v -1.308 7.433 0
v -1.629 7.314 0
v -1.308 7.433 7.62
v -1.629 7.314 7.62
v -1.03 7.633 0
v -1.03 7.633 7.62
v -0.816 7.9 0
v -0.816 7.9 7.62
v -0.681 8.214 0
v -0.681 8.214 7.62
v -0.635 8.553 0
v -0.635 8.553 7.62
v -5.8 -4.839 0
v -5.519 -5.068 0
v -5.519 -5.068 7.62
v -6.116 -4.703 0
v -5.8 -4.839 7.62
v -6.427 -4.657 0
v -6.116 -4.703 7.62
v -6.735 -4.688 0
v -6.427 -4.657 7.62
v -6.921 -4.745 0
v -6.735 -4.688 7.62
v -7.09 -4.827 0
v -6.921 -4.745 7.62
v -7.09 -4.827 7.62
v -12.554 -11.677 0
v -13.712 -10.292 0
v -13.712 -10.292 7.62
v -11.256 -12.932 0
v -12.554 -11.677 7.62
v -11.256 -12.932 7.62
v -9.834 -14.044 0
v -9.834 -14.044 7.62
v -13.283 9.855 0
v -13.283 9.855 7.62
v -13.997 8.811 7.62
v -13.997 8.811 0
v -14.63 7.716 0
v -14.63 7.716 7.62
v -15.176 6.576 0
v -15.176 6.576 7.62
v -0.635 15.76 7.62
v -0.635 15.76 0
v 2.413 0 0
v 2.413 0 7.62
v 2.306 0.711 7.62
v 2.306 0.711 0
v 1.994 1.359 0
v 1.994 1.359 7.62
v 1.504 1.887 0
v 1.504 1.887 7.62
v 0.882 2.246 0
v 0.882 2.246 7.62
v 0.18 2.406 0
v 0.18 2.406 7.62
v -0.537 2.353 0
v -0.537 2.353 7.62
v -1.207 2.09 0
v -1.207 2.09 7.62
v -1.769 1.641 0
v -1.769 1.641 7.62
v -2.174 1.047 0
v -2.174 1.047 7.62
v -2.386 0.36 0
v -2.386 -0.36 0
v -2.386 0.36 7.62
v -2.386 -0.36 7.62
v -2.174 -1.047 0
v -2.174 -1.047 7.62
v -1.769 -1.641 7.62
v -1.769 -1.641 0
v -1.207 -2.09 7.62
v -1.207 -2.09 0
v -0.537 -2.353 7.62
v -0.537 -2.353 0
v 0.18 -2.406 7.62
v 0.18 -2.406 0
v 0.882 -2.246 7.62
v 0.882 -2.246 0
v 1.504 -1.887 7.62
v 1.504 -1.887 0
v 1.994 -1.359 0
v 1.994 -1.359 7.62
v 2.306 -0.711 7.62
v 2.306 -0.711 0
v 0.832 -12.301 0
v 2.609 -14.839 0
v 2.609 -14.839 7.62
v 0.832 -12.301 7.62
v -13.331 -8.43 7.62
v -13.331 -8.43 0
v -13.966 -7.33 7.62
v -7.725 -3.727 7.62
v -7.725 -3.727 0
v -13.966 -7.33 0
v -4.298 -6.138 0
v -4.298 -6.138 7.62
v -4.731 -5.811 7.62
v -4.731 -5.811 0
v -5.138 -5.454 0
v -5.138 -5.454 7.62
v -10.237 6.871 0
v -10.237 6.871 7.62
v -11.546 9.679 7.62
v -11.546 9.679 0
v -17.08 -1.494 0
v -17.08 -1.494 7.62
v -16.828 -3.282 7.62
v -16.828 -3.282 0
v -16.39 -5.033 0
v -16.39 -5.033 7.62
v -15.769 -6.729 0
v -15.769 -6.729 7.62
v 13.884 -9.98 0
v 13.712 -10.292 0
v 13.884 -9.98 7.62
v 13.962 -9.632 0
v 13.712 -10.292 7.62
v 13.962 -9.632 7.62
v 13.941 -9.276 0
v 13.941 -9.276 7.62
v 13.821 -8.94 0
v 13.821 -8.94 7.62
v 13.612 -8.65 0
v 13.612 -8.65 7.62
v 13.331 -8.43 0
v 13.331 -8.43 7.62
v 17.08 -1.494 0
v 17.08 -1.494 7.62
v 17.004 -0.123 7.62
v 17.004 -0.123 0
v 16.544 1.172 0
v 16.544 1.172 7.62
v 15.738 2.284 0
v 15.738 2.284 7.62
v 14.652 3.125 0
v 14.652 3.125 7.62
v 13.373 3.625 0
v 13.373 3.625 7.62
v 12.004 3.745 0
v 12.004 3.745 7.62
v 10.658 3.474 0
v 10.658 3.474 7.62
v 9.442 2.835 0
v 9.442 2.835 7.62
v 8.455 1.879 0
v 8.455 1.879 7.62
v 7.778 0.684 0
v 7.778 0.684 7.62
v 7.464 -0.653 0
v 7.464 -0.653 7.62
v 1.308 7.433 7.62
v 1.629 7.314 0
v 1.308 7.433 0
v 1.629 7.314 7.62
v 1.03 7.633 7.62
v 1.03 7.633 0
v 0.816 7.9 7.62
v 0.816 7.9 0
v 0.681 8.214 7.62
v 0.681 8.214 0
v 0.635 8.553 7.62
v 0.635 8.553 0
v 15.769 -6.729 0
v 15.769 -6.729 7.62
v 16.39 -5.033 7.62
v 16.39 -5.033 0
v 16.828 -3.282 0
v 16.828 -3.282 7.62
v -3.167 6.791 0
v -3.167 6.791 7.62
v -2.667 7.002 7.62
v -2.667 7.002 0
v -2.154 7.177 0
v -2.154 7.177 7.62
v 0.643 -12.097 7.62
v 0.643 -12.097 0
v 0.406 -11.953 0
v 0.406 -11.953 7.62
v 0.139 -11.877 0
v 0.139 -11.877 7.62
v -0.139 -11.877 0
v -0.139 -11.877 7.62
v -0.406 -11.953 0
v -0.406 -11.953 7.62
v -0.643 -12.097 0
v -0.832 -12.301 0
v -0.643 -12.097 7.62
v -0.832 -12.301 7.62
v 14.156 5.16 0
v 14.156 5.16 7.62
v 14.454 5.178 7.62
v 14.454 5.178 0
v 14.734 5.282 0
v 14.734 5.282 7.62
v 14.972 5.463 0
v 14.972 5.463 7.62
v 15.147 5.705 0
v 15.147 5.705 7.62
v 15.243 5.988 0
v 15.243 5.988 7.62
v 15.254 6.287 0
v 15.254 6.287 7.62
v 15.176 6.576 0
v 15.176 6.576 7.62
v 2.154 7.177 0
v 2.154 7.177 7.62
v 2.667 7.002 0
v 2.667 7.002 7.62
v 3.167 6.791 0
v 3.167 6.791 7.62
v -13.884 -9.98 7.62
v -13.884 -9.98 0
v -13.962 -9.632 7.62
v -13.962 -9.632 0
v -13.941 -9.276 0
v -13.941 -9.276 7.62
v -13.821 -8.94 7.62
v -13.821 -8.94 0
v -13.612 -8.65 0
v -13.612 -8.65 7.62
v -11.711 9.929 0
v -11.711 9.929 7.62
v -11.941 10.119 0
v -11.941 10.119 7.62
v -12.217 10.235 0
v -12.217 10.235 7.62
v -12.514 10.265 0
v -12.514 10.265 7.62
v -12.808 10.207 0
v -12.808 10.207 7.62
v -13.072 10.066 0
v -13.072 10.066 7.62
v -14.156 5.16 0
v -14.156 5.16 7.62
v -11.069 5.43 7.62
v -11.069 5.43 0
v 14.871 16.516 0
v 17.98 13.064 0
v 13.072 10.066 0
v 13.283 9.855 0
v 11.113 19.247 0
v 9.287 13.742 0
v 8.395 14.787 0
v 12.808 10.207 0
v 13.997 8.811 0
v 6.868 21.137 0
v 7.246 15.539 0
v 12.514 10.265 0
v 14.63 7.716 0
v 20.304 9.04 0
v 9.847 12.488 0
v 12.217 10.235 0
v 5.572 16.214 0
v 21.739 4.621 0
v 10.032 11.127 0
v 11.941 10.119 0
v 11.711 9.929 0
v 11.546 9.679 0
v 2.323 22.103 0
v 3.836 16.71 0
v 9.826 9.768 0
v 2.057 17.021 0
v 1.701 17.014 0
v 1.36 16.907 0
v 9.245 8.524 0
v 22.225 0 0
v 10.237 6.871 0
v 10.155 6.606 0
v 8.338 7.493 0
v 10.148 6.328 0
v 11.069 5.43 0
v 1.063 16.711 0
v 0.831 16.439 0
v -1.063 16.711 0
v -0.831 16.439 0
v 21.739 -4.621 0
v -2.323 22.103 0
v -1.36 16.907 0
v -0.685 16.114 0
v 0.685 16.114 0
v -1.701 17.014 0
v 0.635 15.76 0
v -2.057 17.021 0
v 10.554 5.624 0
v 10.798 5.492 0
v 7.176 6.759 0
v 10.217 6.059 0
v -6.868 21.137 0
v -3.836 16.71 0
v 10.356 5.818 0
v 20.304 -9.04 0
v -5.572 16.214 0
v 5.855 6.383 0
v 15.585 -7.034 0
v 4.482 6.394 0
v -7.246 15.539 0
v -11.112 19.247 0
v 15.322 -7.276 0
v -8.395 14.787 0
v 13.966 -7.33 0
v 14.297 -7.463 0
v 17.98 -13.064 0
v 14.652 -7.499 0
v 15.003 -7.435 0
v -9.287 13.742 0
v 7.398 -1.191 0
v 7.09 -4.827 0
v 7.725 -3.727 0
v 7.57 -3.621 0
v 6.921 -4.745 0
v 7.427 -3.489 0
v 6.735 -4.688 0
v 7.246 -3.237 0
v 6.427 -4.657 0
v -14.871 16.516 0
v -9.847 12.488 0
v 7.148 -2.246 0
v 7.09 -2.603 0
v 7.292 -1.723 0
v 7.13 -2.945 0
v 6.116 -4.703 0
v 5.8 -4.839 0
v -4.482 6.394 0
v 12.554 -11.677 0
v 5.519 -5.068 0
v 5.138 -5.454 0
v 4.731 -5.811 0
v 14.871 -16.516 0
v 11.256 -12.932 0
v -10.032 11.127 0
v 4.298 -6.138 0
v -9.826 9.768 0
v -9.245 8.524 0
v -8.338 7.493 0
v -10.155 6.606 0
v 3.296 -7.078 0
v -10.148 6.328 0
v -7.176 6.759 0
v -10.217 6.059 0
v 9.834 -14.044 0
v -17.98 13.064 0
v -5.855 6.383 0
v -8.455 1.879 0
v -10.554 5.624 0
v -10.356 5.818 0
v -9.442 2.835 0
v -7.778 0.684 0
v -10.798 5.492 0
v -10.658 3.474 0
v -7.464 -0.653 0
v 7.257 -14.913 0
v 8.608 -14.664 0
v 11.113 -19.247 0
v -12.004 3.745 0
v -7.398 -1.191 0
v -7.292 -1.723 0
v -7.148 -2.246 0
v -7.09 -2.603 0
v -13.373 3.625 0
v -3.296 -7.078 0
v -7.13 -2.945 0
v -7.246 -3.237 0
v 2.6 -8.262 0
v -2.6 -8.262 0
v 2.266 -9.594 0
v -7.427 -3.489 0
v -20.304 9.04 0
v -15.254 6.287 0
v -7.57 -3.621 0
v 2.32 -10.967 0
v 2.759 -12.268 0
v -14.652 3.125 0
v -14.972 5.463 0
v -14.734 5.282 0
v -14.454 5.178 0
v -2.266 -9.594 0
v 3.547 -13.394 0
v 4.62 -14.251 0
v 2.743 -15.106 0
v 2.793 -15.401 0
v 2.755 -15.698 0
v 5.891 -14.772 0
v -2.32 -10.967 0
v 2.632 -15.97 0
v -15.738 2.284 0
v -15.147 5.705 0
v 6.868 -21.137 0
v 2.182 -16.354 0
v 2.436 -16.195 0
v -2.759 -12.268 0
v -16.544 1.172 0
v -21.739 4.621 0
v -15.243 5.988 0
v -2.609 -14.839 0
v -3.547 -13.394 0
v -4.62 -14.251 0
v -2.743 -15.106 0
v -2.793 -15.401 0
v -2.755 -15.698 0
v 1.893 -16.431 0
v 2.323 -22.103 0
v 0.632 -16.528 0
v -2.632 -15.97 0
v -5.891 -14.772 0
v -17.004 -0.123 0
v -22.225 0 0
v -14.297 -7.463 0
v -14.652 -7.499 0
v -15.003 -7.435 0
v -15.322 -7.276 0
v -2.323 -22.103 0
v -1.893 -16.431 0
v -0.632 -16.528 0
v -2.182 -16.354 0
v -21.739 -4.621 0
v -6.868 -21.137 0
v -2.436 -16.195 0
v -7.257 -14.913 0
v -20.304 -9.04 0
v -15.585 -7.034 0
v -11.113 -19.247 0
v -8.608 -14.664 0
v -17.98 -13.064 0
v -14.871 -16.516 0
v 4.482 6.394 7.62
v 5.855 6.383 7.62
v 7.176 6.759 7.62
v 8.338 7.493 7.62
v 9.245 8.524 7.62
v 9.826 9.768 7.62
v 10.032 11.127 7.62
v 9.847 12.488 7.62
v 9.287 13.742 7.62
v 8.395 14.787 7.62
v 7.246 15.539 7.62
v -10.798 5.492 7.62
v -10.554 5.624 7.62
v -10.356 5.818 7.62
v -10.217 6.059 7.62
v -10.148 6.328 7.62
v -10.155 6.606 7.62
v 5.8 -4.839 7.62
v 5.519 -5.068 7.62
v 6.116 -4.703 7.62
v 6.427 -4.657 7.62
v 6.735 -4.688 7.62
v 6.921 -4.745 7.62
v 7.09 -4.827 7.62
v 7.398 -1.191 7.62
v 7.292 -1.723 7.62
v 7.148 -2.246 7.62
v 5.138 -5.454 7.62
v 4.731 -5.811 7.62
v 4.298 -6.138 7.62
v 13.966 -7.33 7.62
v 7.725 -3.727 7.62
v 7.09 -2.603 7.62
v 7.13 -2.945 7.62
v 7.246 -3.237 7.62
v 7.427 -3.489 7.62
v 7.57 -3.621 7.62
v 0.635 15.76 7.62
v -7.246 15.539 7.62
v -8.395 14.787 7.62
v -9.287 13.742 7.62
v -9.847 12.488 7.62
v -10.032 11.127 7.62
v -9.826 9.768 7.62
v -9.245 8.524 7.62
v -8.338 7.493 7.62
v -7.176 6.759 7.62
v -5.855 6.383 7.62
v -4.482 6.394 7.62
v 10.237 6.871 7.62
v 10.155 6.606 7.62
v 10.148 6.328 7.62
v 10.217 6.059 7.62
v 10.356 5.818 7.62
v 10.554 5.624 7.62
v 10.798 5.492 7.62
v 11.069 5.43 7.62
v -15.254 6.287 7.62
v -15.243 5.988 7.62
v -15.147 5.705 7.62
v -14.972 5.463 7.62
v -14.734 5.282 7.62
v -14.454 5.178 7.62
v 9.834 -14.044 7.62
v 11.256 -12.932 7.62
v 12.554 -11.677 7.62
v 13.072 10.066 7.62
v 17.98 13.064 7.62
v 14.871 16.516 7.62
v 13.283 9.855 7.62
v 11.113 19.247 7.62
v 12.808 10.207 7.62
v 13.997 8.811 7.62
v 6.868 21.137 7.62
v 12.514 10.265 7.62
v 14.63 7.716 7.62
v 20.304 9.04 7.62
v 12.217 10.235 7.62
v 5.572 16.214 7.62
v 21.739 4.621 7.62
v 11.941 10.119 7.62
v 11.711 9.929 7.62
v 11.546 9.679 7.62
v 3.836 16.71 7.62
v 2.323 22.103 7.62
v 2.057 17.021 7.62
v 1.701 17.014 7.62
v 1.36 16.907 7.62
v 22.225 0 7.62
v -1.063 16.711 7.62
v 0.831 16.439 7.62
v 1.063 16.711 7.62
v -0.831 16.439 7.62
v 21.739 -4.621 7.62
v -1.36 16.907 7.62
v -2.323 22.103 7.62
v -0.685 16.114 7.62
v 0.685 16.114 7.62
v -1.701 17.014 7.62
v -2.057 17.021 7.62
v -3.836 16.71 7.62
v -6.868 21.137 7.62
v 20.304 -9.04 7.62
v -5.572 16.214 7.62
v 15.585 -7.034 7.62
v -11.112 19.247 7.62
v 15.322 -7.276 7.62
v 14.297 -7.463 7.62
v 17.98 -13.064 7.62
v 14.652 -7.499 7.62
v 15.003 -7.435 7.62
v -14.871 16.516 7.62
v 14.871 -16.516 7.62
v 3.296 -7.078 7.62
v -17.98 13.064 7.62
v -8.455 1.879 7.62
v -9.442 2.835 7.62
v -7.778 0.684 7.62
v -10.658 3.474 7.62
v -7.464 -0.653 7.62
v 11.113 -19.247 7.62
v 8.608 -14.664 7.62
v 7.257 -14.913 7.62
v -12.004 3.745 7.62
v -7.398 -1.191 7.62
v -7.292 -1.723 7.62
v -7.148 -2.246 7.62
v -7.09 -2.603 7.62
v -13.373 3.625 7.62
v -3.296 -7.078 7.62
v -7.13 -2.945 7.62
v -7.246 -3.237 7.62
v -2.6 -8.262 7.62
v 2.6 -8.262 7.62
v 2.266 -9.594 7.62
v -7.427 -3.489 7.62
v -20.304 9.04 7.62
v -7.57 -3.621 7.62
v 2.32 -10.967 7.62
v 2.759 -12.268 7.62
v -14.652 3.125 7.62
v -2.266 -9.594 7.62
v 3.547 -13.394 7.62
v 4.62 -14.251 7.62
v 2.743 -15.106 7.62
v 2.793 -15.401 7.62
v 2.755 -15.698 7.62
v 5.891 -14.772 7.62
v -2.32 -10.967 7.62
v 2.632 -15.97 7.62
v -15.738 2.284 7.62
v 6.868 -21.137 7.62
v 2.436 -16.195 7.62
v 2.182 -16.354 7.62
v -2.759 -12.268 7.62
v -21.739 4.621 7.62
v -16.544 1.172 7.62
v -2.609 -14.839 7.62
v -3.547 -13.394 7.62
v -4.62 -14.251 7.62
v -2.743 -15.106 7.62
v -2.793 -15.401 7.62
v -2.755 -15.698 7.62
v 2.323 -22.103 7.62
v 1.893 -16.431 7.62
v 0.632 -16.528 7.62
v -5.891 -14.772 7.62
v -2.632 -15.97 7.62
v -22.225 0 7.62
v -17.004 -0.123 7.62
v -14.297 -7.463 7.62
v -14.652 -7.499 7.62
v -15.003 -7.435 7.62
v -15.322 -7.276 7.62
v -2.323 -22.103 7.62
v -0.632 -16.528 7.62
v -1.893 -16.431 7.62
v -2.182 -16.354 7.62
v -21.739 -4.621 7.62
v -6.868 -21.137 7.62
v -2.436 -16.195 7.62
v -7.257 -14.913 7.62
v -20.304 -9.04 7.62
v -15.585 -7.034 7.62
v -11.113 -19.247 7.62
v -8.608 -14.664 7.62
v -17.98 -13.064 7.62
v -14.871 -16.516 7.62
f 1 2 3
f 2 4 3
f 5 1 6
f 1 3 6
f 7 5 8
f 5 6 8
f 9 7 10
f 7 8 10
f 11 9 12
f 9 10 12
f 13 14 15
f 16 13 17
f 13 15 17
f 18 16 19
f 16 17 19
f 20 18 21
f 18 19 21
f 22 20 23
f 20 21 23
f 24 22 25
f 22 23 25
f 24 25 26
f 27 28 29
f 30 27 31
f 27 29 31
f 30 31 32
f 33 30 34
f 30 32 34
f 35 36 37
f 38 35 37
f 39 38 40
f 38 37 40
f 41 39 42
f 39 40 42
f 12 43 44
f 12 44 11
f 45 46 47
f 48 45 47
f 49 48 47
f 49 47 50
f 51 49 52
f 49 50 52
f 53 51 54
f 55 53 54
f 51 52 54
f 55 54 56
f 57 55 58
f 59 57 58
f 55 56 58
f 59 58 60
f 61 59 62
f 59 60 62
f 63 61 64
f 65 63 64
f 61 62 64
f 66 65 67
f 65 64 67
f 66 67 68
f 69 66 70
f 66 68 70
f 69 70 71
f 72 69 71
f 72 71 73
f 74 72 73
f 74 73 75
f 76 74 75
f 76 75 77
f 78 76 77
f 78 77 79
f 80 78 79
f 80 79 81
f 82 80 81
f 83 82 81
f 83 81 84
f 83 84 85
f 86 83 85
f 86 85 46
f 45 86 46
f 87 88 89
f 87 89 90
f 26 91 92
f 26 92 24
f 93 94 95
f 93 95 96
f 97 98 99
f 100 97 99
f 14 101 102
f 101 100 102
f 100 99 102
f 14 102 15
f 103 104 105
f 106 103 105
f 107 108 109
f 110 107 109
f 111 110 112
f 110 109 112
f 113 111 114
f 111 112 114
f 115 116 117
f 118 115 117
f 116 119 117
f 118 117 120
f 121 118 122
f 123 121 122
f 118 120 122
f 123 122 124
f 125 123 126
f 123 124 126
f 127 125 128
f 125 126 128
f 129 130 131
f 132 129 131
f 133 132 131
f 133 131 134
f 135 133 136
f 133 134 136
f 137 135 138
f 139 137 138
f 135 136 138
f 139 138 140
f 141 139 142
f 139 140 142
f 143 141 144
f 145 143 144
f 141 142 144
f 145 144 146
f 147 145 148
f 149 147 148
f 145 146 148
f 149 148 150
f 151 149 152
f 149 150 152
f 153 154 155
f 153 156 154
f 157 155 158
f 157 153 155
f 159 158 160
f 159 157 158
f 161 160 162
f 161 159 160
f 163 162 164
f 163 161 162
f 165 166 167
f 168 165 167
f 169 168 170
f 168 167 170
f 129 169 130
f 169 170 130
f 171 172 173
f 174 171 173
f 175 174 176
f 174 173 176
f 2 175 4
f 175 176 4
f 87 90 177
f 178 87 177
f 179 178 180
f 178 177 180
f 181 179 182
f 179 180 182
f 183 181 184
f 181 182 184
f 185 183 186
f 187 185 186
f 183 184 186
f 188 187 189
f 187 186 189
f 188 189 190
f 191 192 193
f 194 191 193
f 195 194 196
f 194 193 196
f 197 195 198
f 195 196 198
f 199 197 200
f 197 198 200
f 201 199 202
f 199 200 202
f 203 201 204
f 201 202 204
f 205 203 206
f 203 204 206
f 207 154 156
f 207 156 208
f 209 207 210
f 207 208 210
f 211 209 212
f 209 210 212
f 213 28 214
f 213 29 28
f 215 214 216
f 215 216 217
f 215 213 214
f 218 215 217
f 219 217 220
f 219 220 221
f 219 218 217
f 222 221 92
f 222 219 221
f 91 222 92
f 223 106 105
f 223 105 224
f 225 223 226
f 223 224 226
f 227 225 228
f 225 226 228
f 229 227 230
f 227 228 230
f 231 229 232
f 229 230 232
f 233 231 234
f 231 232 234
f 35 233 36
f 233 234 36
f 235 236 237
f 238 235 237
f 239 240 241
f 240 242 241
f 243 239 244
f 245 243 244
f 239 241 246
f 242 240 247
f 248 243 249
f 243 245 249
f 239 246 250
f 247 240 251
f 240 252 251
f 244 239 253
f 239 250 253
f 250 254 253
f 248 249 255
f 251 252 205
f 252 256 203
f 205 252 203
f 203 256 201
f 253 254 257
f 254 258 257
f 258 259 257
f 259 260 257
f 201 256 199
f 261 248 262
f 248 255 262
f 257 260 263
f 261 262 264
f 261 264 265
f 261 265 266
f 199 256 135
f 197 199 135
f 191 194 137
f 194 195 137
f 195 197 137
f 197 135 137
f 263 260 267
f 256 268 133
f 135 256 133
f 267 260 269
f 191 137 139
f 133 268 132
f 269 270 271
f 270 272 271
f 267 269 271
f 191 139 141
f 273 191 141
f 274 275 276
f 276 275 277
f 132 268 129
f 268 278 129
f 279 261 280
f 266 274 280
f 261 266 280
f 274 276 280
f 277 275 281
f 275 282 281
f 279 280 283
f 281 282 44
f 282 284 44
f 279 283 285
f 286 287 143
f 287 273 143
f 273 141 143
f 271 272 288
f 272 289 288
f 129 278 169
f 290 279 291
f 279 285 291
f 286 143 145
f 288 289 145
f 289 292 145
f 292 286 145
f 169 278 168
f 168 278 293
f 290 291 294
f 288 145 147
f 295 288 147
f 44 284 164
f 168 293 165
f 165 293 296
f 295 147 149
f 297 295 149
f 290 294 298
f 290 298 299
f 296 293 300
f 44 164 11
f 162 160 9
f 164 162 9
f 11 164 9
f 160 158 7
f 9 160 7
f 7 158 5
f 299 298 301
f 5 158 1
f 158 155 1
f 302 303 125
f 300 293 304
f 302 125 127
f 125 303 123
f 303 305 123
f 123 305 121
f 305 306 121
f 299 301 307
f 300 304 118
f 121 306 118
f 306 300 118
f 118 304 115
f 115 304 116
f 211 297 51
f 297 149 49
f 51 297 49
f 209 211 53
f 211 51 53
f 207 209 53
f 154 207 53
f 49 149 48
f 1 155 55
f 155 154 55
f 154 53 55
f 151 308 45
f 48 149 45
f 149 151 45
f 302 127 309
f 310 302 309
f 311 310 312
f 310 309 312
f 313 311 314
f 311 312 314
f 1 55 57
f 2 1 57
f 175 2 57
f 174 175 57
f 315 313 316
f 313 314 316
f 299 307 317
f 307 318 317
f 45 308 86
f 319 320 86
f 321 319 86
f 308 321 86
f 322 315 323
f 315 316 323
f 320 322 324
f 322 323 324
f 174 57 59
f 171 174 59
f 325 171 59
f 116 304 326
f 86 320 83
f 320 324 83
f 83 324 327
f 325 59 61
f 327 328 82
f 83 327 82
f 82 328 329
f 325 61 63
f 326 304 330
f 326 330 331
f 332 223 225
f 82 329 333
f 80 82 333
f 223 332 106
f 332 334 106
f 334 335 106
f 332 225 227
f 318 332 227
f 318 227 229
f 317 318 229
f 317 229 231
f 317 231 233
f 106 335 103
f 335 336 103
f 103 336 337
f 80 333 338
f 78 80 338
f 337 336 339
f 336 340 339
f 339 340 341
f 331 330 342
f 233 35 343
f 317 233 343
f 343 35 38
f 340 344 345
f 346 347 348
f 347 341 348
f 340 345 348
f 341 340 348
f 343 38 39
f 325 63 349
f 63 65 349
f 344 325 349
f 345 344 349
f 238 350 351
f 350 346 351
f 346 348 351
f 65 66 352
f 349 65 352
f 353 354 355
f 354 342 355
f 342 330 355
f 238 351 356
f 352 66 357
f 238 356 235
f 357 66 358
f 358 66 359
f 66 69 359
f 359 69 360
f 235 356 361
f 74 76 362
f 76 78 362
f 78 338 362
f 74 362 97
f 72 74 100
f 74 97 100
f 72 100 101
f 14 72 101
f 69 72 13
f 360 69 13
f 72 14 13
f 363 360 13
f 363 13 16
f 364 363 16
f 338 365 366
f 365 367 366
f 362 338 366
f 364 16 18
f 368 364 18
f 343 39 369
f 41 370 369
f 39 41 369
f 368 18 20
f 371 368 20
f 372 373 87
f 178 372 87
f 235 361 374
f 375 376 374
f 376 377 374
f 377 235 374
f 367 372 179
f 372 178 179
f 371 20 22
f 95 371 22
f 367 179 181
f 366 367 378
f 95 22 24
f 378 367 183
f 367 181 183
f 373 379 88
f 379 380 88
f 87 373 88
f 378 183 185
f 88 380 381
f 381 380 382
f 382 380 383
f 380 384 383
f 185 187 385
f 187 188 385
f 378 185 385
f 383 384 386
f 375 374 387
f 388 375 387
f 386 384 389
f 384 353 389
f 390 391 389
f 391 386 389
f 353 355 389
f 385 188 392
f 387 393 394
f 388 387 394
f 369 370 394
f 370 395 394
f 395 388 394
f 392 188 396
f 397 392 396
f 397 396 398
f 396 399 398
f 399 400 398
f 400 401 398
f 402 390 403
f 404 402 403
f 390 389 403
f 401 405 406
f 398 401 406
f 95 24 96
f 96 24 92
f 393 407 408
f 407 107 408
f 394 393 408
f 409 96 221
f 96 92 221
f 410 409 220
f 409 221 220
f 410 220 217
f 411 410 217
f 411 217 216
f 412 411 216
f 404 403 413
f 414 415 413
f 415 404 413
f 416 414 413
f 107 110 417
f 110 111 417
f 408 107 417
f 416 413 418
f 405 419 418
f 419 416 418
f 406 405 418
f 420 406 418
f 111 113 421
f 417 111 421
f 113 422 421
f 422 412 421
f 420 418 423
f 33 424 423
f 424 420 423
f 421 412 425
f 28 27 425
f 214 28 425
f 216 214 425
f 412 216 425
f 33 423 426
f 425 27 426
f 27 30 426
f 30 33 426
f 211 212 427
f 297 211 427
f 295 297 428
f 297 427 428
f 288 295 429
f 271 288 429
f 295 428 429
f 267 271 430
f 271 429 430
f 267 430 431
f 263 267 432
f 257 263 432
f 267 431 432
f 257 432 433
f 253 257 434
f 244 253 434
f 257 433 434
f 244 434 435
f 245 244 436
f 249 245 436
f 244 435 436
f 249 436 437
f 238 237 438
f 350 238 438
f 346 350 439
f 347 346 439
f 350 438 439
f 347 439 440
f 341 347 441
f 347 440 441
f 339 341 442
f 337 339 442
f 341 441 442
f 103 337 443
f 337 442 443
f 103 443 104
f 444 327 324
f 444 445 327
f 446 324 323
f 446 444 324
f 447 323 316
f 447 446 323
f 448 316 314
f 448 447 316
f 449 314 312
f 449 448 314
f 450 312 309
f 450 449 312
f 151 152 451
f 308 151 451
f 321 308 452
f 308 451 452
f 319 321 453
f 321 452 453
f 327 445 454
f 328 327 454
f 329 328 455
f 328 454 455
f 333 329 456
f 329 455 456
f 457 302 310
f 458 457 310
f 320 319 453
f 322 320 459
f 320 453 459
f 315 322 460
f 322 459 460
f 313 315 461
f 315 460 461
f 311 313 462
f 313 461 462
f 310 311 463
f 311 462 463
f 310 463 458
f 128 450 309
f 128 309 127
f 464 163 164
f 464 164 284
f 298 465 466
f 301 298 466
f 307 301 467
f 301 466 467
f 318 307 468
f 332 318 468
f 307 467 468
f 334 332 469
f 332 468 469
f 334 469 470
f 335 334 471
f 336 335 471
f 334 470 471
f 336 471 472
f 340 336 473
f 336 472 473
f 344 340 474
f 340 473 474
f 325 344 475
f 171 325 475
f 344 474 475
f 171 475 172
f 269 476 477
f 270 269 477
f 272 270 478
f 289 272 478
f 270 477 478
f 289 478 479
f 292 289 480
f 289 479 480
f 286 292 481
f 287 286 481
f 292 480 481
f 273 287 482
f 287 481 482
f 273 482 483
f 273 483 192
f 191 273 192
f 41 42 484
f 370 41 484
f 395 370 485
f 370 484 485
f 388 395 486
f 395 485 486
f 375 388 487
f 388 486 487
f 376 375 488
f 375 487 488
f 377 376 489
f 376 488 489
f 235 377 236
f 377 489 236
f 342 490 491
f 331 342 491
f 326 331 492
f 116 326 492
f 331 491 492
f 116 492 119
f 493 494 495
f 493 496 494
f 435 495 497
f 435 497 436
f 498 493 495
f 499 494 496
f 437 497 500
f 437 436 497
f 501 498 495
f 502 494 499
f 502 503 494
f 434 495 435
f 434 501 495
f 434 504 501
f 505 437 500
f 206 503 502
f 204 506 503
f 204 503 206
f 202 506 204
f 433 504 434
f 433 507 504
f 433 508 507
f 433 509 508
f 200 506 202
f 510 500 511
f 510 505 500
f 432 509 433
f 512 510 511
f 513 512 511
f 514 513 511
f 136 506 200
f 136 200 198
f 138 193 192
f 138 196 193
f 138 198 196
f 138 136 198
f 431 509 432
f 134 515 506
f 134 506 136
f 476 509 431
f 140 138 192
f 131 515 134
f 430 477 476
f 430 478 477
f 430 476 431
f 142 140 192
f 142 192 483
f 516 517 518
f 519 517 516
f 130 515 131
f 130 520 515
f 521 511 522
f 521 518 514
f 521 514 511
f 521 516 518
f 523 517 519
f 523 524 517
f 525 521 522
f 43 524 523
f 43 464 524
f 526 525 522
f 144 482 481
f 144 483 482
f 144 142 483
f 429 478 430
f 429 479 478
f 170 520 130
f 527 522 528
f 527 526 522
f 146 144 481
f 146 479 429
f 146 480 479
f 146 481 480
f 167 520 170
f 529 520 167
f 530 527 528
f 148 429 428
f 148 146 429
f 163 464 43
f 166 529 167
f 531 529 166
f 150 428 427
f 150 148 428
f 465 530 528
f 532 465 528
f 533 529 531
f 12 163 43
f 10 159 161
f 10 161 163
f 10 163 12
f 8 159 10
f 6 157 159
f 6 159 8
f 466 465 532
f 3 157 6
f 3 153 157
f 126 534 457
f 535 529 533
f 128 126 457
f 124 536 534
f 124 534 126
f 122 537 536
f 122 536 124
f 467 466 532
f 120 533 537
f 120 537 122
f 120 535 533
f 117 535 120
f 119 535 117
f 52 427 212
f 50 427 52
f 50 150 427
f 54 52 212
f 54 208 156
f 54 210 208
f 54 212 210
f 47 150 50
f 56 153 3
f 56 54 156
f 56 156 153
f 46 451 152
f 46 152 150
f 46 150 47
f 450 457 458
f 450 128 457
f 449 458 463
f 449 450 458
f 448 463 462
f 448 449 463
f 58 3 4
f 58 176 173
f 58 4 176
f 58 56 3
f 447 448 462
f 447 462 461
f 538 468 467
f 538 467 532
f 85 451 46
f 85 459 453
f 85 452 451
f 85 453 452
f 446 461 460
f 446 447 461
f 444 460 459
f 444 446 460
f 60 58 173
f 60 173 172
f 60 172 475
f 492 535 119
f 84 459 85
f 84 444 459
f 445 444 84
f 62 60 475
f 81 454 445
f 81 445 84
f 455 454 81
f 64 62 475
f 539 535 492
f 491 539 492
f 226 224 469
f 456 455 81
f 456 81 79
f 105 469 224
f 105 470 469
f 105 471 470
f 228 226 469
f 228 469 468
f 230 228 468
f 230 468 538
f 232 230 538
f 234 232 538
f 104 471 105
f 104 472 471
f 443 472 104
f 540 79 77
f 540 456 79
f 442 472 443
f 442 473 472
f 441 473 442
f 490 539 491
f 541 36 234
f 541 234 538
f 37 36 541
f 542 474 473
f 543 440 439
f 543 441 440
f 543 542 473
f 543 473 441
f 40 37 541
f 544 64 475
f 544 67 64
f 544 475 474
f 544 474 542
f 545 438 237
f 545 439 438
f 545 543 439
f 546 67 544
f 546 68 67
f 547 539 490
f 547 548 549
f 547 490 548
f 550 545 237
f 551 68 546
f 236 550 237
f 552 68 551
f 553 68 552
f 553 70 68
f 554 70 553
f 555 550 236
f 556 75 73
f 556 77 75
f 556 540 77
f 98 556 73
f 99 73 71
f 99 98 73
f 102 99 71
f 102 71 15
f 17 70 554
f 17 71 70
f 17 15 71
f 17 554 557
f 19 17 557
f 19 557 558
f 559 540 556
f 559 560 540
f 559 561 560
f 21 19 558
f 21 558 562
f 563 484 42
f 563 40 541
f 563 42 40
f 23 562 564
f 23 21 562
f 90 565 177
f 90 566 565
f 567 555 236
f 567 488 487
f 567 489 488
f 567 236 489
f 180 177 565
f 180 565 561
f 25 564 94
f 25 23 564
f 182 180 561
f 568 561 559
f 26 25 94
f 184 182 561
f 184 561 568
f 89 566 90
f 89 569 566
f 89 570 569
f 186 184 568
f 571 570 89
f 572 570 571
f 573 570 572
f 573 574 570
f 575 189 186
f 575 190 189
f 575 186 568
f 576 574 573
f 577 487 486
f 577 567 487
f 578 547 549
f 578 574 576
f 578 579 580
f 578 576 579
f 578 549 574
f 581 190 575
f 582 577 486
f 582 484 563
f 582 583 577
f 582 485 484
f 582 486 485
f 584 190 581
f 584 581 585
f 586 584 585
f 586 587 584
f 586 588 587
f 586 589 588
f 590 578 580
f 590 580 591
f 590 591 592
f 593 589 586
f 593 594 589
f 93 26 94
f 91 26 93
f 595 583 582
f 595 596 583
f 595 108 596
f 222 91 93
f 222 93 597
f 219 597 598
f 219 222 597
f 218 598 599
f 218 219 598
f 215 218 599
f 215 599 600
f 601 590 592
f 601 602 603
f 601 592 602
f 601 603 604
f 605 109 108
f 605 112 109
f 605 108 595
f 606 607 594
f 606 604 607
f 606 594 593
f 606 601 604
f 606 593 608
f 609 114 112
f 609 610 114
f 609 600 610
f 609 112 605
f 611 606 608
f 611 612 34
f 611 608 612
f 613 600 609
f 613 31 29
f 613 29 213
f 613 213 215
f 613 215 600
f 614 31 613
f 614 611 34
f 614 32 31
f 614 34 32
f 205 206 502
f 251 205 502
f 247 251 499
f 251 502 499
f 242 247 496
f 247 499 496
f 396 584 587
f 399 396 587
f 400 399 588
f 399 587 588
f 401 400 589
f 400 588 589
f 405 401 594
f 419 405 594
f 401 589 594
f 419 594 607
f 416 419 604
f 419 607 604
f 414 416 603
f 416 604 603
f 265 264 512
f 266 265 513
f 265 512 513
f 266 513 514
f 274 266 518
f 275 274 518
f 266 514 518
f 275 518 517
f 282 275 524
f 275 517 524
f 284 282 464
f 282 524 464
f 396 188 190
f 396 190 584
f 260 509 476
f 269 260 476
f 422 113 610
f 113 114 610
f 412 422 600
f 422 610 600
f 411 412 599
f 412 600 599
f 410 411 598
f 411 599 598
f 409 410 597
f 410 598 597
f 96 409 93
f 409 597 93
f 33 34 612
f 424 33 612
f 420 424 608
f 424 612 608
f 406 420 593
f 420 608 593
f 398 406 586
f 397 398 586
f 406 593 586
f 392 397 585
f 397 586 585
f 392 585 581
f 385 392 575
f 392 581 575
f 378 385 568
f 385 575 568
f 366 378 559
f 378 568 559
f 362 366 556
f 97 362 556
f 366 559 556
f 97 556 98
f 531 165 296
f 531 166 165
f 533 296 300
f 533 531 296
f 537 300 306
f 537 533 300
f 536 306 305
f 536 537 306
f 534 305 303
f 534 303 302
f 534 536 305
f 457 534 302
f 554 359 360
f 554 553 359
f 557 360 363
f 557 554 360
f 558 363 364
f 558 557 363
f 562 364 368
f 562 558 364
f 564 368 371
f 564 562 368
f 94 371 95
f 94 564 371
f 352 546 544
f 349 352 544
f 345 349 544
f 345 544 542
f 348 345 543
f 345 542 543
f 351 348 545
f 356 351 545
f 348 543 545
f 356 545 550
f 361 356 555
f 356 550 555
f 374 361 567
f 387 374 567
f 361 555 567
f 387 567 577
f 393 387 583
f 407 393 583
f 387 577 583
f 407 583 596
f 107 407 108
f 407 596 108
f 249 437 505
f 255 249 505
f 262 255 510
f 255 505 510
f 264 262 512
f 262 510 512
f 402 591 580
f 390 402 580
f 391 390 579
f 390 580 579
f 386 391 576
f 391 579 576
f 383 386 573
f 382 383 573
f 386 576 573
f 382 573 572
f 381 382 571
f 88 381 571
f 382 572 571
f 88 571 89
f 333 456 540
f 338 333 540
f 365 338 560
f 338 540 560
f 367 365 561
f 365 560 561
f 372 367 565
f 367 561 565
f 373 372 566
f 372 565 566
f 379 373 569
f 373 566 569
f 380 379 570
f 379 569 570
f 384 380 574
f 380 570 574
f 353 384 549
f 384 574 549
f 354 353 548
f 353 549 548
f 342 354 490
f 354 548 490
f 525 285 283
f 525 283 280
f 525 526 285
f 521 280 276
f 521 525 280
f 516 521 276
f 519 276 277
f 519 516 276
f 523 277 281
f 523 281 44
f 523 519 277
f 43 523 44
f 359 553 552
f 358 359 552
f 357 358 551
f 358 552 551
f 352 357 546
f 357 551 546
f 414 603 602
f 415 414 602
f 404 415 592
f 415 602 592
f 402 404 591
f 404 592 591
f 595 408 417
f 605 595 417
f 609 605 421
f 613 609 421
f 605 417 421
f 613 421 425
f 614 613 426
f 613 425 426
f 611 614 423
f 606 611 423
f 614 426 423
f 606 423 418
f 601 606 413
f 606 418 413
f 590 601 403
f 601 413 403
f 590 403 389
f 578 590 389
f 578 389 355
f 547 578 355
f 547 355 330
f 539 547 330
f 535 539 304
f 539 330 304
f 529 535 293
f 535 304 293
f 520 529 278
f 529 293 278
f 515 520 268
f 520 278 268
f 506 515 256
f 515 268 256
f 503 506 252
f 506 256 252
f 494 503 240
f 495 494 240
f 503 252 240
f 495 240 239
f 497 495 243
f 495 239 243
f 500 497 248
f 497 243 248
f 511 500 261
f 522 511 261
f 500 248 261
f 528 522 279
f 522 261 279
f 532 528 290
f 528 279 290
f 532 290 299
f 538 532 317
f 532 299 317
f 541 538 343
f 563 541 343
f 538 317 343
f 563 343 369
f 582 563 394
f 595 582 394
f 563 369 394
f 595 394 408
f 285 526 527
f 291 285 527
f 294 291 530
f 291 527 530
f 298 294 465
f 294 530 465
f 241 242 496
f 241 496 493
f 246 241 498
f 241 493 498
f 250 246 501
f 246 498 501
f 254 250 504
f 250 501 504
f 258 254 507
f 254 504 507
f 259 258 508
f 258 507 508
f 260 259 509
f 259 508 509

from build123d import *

# Parameters (mm, degrees)
SKETCH1_R           = 22.225
BOSS_EXTRUDE1_DEPTH = 7.62
SKETCH2_R           = 2.413
CUT_EXTRUDE1_DEPTH  = 33.341392209
EXTRUDE_THIN1_DEPTH = 7.62
FILLET1_R           = 1.27


with BuildPart() as part:
    # Sketch1 → Boss-Extrude1 (new body)
    with BuildSketch(Plane.XY):
        with Locations(Location((0, 0, 0), (0, 0, 180))):
            Circle(SKETCH1_R)
    extrude(amount=BOSS_EXTRUDE1_DEPTH)

    # Sketch2 → Cut-Extrude1 (cut, through all)
    with BuildSketch(Plane.XY.offset(7.62)):
        Circle(SKETCH2_R)
        with BuildLine():
            Line((11.546285712, 9.679232711), (10.236925711, 6.871301126))
            ThreePointArc((10.236925711, 6.871301126), (10.277852612, 5.933920972), (11.069184188, 5.429787159))
            Line((11.069184188, 5.429787159), (14.155604273, 5.159760391))
            ThreePointArc((14.155604273, 5.159760391), (15.068334078, 5.577769607), (15.176404699, 6.575831801))
            ThreePointArc((15.176404699, 6.575831801), (14.323882769, 8.269897573), (13.28303974, 9.855236107))
            ThreePointArc((13.28303974, 9.855236107), (12.364657215, 10.260675301), (11.546285712, 9.679232711))
        make_face()
        with BuildLine():
            Line((2.609318561, -14.838993102), (0.832258477, -12.301088285))
            ThreePointArc((0.832258477, -12.301088285), (0, -11.867841944), (-0.832258477, -12.301088285))
            Line((-0.832258477, -12.301088285), (-2.609318561, -14.838993102))
            ThreePointArc((-2.609318561, -14.838993102), (-2.703676863, -15.838444908), (-1.893364959, -16.431067908))
            ThreePointArc((-1.893364959, -16.431067908), (0, -16.539795145), (1.893364959, -16.431067908))
            ThreePointArc((1.893364959, -16.431067908), (2.703676863, -15.838444908), (2.609318561, -14.838993102))
        make_face()
        with BuildLine():
            Line((-14.155604273, 5.159760391), (-11.069184188, 5.429787159))
            ThreePointArc((-11.069184188, 5.429787159), (-10.277852612, 5.933920972), (-10.236925711, 6.871301126))
            Line((-10.236925711, 6.871301126), (-11.546285712, 9.679232711))
            ThreePointArc((-11.546285712, 9.679232711), (-12.364657215, 10.260675301), (-13.28303974, 9.855236107))
            ThreePointArc((-13.28303974, 9.855236107), (-14.323882769, 8.269897573), (-15.176404699, 6.575831801))
            ThreePointArc((-15.176404699, 6.575831801), (-15.068334078, 5.577769607), (-14.155604273, 5.159760391))
        make_face()
        with BuildLine():
            ThreePointArc((7.245790098, 15.538647009), (0, 17.145), (-7.245790098, 15.538647009))
            ThreePointArc((-7.245790098, 15.538647009), (-9.580075747, 9.125249897), (-3.166678635, 6.790964248))
            ThreePointArc((-3.166678635, 6.790964248), (0, 7.493), (3.166678635, 6.790964248))
            ThreePointArc((3.166678635, 6.790964248), (9.580075747, 9.125249897), (7.245790098, 15.538647009))
        make_face()
        with BuildLine():
            ThreePointArc((9.833968001, -14.044361799), (14.848005548, -8.5725), (17.079758099, -1.494285209))
            ThreePointArc((17.079758099, -1.494285209), (12.6927361, 3.733964018), (7.464486873, -0.65305798))
            ThreePointArc((7.464486873, -0.65305798), (6.489128351, -3.7465), (4.297808238, -6.137906268))
            ThreePointArc((4.297808238, -6.137906268), (3.112660354, -12.859213915), (9.833968001, -14.044361799))
        make_face()
        with BuildLine():
            ThreePointArc((-17.079758099, -1.494285209), (-14.848005548, -8.5725), (-9.833968001, -14.044361799))
            ThreePointArc((-9.833968001, -14.044361799), (-3.112660354, -12.859213915), (-4.297808238, -6.137906268))
            ThreePointArc((-4.297808238, -6.137906268), (-6.489128351, -3.7465), (-7.464486873, -0.65305798))
            ThreePointArc((-7.464486873, -0.65305798), (-12.6927361, 3.733964018), (-17.079758099, -1.494285209))
        make_face()
    extrude(amount=-CUT_EXTRUDE1_DEPTH, mode=Mode.SUBTRACT)

    # Sketch3 → Extrude-Thin1 (add)
    with BuildSketch(Plane.XY.offset(7.62)):
        Polygon((0.635, 6.223), (0.635, 7.493), (0.635, 17.145), (-0.635, 17.145), (-0.635, 7.493), (-0.635, 6.223), align=None)
        Polygon((5.071776088, -3.661426131), (6.171628351, -4.296426131), (14.530505548, -9.122426131), (15.165505548, -8.022573869), (6.806628351, -3.196573869), (5.706776088, -2.561573869), align=None)
        Polygon((-5.706776088, -2.561573869), (-6.806628351, -3.196573869), (-15.165505548, -8.022573869), (-14.530505548, -9.122426131), (-6.171628351, -4.296426131), (-5.071776088, -3.661426131), align=None)
    extrude(amount=-EXTRUDE_THIN1_DEPTH)

    # Fillet1
    fillet1_edges = [part.edges().sort_by_distance(p)[0] for p in [
        (-0.635, 17.133236705, 3.81),
        (0.635, 17.133236705, 3.81),
        (0.635, 7.466044736, 3.81),
        (-0.635, 7.466044736, 3.81),
        (15.155318236, -8.016692221, 3.81),
        (14.520318236, -9.116544484, 3.81),
        (6.148284407, -4.282948499, 3.81),
        (6.783284407, -3.183096237, 3.81),
        (-14.520318236, -9.116544484, 3.81),
        (-15.155318236, -8.016692221, 3.81),
        (-6.783284407, -3.183096237, 3.81),
        (-6.148284407, -4.282948499, 3.81),
    ]]
    fillet(fillet1_edges, radius=FILLET1_R)


solid = part.part
